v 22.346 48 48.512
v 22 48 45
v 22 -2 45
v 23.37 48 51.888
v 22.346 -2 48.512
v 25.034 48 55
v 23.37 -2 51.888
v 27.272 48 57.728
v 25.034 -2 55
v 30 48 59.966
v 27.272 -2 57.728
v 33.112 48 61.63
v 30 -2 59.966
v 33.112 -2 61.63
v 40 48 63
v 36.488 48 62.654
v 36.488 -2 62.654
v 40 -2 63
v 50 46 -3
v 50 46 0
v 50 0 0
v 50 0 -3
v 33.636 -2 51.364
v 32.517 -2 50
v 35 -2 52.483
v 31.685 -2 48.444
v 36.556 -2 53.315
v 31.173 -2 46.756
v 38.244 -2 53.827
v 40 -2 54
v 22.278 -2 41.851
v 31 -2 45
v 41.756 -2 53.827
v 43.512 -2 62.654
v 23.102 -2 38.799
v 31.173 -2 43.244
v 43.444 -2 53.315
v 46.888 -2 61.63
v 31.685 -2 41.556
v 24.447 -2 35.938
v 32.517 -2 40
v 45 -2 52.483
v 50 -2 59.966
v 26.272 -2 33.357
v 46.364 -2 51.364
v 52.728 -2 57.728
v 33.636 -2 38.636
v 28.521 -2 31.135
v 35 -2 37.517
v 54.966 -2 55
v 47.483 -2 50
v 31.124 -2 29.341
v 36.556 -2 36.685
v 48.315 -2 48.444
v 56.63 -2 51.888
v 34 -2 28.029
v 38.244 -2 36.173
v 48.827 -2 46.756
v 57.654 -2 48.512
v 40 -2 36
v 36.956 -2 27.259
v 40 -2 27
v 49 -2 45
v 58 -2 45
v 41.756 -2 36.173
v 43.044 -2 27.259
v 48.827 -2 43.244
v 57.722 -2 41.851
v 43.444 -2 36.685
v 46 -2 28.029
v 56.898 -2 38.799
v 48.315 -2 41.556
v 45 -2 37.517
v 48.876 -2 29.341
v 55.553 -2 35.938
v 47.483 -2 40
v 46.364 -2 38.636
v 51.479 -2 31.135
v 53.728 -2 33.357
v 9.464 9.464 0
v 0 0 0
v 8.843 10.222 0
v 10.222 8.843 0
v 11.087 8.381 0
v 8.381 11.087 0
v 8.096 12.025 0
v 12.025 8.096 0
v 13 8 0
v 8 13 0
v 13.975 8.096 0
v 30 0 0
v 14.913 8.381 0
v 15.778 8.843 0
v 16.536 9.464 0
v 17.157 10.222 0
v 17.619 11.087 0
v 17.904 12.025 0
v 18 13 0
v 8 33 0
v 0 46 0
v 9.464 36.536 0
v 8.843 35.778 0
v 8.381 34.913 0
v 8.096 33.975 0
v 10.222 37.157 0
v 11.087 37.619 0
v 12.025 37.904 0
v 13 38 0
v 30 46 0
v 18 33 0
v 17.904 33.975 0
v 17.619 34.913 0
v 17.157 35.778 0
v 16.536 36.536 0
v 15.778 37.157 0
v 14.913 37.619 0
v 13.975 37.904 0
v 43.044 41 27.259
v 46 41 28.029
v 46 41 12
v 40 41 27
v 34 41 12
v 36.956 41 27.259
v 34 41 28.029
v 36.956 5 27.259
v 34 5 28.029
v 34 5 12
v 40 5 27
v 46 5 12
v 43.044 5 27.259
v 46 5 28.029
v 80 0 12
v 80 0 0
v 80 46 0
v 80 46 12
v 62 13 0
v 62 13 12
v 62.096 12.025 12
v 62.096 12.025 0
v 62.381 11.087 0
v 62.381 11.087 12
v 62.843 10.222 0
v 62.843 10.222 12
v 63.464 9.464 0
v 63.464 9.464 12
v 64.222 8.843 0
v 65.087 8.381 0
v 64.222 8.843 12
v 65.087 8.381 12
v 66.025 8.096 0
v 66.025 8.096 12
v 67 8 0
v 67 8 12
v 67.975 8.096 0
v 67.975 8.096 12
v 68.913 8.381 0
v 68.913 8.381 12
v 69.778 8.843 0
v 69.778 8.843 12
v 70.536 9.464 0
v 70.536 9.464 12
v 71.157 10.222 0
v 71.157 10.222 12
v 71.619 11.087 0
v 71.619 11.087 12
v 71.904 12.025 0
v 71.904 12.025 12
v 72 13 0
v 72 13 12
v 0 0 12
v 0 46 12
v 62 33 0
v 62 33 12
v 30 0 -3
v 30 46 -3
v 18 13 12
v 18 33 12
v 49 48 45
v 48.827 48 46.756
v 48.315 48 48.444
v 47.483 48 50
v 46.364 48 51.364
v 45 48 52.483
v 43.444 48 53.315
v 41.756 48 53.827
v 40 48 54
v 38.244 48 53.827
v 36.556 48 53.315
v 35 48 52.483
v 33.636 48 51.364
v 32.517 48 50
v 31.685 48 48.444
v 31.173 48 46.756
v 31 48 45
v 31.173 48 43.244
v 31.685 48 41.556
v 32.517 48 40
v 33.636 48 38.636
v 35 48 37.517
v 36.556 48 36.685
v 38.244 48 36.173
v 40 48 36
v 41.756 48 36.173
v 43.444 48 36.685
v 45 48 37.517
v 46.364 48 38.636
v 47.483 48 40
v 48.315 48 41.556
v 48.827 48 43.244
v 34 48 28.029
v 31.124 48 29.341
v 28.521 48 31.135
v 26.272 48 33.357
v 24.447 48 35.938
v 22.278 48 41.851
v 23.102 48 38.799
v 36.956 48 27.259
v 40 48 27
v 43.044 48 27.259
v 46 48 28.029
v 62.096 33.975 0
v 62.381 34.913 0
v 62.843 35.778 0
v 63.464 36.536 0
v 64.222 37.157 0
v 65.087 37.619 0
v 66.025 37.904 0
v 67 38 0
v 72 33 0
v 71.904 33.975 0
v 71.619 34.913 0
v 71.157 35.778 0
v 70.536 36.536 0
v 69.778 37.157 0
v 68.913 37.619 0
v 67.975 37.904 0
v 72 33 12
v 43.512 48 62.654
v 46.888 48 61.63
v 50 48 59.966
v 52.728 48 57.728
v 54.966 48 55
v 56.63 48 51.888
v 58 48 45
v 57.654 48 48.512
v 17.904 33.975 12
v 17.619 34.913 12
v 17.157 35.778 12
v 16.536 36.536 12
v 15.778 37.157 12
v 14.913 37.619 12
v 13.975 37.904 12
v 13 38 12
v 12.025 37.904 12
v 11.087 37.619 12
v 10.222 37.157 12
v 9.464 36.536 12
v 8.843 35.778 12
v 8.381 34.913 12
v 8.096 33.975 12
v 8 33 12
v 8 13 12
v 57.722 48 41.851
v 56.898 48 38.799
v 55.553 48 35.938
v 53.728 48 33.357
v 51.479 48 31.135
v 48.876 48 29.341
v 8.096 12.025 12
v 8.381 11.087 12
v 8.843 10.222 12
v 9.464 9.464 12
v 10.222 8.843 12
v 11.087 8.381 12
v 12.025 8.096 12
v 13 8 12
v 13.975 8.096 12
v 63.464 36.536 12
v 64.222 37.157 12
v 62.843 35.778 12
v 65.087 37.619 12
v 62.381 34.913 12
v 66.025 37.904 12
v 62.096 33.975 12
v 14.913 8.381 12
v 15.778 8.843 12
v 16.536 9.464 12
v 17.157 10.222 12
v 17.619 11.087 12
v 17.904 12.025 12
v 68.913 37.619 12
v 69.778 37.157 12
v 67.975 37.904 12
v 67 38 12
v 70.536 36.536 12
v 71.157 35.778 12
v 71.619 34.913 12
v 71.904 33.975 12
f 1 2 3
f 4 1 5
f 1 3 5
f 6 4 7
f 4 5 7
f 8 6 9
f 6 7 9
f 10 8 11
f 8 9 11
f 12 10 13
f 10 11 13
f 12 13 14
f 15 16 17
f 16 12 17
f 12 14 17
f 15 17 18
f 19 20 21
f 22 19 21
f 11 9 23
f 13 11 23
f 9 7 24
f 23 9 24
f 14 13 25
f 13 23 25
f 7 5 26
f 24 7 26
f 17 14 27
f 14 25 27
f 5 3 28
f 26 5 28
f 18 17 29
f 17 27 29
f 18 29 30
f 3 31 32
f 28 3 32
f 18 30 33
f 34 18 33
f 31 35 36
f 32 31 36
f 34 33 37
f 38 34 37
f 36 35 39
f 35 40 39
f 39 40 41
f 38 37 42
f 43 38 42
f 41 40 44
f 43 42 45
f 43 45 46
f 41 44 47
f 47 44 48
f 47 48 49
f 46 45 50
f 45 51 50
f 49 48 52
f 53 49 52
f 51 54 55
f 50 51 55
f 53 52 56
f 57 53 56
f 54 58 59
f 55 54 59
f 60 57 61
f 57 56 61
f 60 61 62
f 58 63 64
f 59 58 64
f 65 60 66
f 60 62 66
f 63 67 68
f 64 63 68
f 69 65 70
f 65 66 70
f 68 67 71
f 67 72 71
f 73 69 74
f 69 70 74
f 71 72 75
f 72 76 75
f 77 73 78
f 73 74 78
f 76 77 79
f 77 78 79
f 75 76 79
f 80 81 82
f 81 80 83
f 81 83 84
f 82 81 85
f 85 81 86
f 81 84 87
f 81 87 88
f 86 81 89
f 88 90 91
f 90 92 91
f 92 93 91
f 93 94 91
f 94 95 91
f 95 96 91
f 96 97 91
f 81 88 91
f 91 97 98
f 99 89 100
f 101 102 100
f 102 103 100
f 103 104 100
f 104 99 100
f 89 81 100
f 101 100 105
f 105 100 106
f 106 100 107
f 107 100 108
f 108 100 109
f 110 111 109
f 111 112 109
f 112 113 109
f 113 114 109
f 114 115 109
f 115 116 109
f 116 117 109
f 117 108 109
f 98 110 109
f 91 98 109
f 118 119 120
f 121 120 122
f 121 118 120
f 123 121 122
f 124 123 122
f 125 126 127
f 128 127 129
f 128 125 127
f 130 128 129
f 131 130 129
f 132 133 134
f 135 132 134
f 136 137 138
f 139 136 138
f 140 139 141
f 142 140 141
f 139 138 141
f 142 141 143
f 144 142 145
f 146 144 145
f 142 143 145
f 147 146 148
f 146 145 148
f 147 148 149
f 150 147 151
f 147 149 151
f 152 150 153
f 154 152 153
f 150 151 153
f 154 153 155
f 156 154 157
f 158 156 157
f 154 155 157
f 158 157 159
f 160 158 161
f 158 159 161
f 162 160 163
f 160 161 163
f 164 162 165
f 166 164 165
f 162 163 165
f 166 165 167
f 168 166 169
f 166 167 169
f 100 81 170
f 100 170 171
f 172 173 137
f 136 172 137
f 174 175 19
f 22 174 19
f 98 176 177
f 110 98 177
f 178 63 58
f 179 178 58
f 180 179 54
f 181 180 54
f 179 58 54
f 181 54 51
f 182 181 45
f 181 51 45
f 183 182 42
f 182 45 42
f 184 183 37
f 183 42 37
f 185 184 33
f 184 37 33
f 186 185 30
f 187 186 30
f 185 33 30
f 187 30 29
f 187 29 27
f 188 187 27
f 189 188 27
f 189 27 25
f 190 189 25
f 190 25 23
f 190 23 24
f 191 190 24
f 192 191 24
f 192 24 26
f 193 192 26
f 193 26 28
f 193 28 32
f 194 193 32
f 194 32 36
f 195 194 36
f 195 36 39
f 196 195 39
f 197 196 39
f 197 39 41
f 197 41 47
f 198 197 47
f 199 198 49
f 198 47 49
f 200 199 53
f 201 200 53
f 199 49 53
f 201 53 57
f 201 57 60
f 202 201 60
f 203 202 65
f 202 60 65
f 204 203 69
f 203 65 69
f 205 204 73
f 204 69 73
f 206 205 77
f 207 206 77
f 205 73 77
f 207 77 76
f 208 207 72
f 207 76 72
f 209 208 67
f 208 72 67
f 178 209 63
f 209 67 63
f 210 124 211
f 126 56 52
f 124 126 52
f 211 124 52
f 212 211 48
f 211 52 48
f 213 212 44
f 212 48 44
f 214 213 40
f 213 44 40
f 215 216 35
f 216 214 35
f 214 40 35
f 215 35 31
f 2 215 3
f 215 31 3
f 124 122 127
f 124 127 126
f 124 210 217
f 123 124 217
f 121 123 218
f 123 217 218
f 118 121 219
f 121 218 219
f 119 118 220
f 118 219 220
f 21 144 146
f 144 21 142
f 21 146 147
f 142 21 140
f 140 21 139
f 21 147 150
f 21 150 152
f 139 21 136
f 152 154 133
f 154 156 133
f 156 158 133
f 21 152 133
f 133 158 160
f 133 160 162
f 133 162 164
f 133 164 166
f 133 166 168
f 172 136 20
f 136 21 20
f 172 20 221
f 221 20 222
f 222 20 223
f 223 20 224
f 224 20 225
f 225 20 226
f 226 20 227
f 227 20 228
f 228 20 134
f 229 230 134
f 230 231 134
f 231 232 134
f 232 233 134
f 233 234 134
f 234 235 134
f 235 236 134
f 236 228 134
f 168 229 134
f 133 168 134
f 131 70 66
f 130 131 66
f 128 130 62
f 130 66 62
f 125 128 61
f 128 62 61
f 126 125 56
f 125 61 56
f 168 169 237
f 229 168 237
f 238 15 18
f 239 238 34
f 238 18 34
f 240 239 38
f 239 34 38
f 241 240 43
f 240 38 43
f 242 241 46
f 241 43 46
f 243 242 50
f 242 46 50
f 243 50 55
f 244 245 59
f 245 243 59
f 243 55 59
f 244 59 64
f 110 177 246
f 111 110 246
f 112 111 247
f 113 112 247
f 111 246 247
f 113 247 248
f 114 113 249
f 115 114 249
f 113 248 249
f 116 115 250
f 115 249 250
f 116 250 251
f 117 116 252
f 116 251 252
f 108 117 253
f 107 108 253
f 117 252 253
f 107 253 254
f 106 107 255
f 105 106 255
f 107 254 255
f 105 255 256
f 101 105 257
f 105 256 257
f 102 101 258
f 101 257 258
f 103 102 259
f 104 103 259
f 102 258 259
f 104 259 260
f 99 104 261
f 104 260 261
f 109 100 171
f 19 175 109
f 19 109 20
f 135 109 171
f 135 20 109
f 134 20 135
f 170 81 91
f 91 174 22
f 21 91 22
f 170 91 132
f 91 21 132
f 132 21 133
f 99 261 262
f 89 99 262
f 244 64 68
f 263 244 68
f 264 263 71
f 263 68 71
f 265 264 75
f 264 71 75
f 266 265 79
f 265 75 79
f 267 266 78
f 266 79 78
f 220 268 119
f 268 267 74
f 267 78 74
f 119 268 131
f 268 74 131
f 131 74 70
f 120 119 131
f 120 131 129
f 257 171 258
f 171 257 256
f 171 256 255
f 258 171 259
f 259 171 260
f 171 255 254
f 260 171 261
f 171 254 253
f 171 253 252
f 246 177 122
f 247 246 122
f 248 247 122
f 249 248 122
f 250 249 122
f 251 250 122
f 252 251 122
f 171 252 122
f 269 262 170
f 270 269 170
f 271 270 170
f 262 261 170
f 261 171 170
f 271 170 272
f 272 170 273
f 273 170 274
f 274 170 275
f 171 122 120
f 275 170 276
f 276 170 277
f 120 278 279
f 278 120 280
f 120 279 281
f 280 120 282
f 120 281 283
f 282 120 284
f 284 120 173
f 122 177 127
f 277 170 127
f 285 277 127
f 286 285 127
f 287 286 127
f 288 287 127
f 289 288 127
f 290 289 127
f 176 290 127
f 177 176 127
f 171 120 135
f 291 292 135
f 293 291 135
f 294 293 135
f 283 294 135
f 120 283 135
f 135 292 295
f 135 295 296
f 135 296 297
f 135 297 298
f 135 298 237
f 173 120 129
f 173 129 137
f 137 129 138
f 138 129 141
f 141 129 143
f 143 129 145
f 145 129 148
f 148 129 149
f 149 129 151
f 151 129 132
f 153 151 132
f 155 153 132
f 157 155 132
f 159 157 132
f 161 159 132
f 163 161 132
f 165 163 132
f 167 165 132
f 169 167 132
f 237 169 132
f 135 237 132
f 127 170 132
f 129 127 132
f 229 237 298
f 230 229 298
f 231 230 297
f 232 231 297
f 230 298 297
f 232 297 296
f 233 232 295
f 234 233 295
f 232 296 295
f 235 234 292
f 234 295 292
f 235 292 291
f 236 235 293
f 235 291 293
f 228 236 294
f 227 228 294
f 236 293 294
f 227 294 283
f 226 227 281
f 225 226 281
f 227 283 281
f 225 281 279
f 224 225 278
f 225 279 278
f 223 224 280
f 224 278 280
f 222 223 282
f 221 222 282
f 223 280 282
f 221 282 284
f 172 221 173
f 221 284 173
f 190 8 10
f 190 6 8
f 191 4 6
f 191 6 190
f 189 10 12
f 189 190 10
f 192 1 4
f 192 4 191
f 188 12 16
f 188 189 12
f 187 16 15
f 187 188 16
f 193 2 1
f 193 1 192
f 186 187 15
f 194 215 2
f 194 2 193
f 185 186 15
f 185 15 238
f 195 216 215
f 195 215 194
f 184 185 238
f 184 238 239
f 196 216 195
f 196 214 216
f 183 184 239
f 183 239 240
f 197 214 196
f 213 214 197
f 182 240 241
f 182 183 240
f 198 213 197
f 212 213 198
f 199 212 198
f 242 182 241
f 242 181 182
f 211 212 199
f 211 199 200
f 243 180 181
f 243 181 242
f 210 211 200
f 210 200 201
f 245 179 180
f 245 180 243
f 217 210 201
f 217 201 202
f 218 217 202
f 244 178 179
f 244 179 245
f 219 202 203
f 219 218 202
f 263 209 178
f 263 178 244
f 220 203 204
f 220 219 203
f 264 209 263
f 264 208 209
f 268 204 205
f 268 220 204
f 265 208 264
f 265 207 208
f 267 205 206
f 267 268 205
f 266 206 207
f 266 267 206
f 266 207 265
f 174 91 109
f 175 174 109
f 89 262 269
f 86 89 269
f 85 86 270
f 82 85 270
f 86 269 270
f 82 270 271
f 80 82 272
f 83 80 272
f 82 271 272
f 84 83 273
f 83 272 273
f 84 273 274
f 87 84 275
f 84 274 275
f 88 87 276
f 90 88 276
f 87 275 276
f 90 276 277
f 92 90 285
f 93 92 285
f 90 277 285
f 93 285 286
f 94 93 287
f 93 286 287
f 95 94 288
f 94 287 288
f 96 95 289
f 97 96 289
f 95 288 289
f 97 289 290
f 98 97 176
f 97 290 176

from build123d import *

# Parameters (mm, degrees)
F0_W      = 80
F0_H      = 46
F1_DEPTH  = 12
F3_DEPTH  = 3
F5_DEPTH  = 12
F6_W      = 36
F6_H      = 46
F6_H_2    = 2
F7_DEPTH  = 51
F8_R      = 9
F9_DEPTH  = 51
F11_DEPTH = 7
F13_DEPTH = 7


with BuildPart() as f1:
    # F0 (on Top) → F1 (new body)
    with BuildSketch(Plane.XY):
        with Locations((40, 23)):
            Rectangle(F0_W, F0_H)
    extrude(amount=F1_DEPTH)

    # F2 (on face) → F3 (join)
    with BuildSketch(Plane(origin=(0, 0, 0), x_dir=(1, 0, 0), z_dir=(0, 0, -1))):
        Polygon((30, -46), (40, -46), (50, -46), (50, 0), (30, 0), align=None)
    extrude(amount=F3_DEPTH)

    # F4 (on face) → F5 (cut)
    with BuildSketch(Plane.XY.offset(12)):
        with BuildLine():
            Line((8, 33), (8, 13))
            ThreePointArc((8, 13), (13, 8), (18, 13))
            Line((18, 13), (18, 33))
            ThreePointArc((18, 33), (13, 38), (8, 33))
        make_face()
        with BuildLine():
            ThreePointArc((72, 33), (67, 38), (62, 33))
            Line((62, 33), (62, 13))
            ThreePointArc((62, 13), (67, 8), (72, 13))
            Line((72, 13), (72, 33))
        make_face()
    extrude(amount=-F5_DEPTH, mode=Mode.SUBTRACT)

    # F6 (on face) → F7 (join)
    with BuildSketch(Plane.XY.offset(12)):
        with Locations((40, 23)):
            Rectangle(F6_W, F6_H)
        with Locations((40, -1)):
            Rectangle(F6_W, F6_H_2)
        with Locations((40, 47)):
            Rectangle(F6_W, F6_H_2)
    extrude(amount=F7_DEPTH)

    # F8 (on face) → F9 (cut)
    with BuildSketch(Plane.XZ.offset(2)):
        with BuildLine():
            Line((22, 63), (22, 45))
            ThreePointArc((22, 45), (27.2720779386, 57.7279220614), (40, 63))
            Line((40, 63), (22, 63))
        make_face()
        with BuildLine():
            ThreePointArc((40, 63), (52.7279220614, 57.7279220614), (58, 45))
            Line((58, 45), (58, 63))
            Line((58, 63), (40, 63))
        make_face()
        with BuildLine():
            ThreePointArc((58, 45), (54.6969384567, 34.6076951546), (46, 28.0294372515))
            Line((46, 28.0294372515), (46, 12))
            Line((46, 12), (58, 12))
            Line((58, 12), (58, 45))
        make_face()
        with BuildLine():
            Line((34, 12), (34, 28.0294372515))
            ThreePointArc((34, 28.0294372515), (25.3030615433, 34.6076951546), (22, 45))
            Line((22, 45), (22, 12))
            Line((22, 12), (34, 12))
        make_face()
        with Locations((40, 45)):
            Circle(F8_R)
    extrude(amount=-F9_DEPTH, mode=Mode.SUBTRACT)

    # F10 (on face) → F11 (cut)
    with BuildSketch(Plane.XZ.offset(2)):
        with BuildLine():
            Line((34, 12), (46, 12))
            Line((46, 12), (46, 28.0294372515))
            ThreePointArc((46, 28.0294372515), (40, 27), (34, 28.0294372515))
            Line((34, 28.0294372515), (34, 12))
        make_face()
    extrude(amount=-F11_DEPTH, mode=Mode.SUBTRACT)

    # F12 (on face) → F13 (cut)
    with BuildSketch(Plane(origin=(0, 48, 0), x_dir=(-1, 0, 0), z_dir=(0, 1, 0))):
        with BuildLine():
            Line((-46, 28.0294372515), (-46, 12))
            Line((-46, 12), (-34, 12))
            Line((-34, 12), (-34, 28.0294372515))
            ThreePointArc((-34, 28.0294372515), (-40, 27), (-46, 28.0294372515))
        make_face()
    extrude(amount=-F13_DEPTH, mode=Mode.SUBTRACT)


solid = f1.part
